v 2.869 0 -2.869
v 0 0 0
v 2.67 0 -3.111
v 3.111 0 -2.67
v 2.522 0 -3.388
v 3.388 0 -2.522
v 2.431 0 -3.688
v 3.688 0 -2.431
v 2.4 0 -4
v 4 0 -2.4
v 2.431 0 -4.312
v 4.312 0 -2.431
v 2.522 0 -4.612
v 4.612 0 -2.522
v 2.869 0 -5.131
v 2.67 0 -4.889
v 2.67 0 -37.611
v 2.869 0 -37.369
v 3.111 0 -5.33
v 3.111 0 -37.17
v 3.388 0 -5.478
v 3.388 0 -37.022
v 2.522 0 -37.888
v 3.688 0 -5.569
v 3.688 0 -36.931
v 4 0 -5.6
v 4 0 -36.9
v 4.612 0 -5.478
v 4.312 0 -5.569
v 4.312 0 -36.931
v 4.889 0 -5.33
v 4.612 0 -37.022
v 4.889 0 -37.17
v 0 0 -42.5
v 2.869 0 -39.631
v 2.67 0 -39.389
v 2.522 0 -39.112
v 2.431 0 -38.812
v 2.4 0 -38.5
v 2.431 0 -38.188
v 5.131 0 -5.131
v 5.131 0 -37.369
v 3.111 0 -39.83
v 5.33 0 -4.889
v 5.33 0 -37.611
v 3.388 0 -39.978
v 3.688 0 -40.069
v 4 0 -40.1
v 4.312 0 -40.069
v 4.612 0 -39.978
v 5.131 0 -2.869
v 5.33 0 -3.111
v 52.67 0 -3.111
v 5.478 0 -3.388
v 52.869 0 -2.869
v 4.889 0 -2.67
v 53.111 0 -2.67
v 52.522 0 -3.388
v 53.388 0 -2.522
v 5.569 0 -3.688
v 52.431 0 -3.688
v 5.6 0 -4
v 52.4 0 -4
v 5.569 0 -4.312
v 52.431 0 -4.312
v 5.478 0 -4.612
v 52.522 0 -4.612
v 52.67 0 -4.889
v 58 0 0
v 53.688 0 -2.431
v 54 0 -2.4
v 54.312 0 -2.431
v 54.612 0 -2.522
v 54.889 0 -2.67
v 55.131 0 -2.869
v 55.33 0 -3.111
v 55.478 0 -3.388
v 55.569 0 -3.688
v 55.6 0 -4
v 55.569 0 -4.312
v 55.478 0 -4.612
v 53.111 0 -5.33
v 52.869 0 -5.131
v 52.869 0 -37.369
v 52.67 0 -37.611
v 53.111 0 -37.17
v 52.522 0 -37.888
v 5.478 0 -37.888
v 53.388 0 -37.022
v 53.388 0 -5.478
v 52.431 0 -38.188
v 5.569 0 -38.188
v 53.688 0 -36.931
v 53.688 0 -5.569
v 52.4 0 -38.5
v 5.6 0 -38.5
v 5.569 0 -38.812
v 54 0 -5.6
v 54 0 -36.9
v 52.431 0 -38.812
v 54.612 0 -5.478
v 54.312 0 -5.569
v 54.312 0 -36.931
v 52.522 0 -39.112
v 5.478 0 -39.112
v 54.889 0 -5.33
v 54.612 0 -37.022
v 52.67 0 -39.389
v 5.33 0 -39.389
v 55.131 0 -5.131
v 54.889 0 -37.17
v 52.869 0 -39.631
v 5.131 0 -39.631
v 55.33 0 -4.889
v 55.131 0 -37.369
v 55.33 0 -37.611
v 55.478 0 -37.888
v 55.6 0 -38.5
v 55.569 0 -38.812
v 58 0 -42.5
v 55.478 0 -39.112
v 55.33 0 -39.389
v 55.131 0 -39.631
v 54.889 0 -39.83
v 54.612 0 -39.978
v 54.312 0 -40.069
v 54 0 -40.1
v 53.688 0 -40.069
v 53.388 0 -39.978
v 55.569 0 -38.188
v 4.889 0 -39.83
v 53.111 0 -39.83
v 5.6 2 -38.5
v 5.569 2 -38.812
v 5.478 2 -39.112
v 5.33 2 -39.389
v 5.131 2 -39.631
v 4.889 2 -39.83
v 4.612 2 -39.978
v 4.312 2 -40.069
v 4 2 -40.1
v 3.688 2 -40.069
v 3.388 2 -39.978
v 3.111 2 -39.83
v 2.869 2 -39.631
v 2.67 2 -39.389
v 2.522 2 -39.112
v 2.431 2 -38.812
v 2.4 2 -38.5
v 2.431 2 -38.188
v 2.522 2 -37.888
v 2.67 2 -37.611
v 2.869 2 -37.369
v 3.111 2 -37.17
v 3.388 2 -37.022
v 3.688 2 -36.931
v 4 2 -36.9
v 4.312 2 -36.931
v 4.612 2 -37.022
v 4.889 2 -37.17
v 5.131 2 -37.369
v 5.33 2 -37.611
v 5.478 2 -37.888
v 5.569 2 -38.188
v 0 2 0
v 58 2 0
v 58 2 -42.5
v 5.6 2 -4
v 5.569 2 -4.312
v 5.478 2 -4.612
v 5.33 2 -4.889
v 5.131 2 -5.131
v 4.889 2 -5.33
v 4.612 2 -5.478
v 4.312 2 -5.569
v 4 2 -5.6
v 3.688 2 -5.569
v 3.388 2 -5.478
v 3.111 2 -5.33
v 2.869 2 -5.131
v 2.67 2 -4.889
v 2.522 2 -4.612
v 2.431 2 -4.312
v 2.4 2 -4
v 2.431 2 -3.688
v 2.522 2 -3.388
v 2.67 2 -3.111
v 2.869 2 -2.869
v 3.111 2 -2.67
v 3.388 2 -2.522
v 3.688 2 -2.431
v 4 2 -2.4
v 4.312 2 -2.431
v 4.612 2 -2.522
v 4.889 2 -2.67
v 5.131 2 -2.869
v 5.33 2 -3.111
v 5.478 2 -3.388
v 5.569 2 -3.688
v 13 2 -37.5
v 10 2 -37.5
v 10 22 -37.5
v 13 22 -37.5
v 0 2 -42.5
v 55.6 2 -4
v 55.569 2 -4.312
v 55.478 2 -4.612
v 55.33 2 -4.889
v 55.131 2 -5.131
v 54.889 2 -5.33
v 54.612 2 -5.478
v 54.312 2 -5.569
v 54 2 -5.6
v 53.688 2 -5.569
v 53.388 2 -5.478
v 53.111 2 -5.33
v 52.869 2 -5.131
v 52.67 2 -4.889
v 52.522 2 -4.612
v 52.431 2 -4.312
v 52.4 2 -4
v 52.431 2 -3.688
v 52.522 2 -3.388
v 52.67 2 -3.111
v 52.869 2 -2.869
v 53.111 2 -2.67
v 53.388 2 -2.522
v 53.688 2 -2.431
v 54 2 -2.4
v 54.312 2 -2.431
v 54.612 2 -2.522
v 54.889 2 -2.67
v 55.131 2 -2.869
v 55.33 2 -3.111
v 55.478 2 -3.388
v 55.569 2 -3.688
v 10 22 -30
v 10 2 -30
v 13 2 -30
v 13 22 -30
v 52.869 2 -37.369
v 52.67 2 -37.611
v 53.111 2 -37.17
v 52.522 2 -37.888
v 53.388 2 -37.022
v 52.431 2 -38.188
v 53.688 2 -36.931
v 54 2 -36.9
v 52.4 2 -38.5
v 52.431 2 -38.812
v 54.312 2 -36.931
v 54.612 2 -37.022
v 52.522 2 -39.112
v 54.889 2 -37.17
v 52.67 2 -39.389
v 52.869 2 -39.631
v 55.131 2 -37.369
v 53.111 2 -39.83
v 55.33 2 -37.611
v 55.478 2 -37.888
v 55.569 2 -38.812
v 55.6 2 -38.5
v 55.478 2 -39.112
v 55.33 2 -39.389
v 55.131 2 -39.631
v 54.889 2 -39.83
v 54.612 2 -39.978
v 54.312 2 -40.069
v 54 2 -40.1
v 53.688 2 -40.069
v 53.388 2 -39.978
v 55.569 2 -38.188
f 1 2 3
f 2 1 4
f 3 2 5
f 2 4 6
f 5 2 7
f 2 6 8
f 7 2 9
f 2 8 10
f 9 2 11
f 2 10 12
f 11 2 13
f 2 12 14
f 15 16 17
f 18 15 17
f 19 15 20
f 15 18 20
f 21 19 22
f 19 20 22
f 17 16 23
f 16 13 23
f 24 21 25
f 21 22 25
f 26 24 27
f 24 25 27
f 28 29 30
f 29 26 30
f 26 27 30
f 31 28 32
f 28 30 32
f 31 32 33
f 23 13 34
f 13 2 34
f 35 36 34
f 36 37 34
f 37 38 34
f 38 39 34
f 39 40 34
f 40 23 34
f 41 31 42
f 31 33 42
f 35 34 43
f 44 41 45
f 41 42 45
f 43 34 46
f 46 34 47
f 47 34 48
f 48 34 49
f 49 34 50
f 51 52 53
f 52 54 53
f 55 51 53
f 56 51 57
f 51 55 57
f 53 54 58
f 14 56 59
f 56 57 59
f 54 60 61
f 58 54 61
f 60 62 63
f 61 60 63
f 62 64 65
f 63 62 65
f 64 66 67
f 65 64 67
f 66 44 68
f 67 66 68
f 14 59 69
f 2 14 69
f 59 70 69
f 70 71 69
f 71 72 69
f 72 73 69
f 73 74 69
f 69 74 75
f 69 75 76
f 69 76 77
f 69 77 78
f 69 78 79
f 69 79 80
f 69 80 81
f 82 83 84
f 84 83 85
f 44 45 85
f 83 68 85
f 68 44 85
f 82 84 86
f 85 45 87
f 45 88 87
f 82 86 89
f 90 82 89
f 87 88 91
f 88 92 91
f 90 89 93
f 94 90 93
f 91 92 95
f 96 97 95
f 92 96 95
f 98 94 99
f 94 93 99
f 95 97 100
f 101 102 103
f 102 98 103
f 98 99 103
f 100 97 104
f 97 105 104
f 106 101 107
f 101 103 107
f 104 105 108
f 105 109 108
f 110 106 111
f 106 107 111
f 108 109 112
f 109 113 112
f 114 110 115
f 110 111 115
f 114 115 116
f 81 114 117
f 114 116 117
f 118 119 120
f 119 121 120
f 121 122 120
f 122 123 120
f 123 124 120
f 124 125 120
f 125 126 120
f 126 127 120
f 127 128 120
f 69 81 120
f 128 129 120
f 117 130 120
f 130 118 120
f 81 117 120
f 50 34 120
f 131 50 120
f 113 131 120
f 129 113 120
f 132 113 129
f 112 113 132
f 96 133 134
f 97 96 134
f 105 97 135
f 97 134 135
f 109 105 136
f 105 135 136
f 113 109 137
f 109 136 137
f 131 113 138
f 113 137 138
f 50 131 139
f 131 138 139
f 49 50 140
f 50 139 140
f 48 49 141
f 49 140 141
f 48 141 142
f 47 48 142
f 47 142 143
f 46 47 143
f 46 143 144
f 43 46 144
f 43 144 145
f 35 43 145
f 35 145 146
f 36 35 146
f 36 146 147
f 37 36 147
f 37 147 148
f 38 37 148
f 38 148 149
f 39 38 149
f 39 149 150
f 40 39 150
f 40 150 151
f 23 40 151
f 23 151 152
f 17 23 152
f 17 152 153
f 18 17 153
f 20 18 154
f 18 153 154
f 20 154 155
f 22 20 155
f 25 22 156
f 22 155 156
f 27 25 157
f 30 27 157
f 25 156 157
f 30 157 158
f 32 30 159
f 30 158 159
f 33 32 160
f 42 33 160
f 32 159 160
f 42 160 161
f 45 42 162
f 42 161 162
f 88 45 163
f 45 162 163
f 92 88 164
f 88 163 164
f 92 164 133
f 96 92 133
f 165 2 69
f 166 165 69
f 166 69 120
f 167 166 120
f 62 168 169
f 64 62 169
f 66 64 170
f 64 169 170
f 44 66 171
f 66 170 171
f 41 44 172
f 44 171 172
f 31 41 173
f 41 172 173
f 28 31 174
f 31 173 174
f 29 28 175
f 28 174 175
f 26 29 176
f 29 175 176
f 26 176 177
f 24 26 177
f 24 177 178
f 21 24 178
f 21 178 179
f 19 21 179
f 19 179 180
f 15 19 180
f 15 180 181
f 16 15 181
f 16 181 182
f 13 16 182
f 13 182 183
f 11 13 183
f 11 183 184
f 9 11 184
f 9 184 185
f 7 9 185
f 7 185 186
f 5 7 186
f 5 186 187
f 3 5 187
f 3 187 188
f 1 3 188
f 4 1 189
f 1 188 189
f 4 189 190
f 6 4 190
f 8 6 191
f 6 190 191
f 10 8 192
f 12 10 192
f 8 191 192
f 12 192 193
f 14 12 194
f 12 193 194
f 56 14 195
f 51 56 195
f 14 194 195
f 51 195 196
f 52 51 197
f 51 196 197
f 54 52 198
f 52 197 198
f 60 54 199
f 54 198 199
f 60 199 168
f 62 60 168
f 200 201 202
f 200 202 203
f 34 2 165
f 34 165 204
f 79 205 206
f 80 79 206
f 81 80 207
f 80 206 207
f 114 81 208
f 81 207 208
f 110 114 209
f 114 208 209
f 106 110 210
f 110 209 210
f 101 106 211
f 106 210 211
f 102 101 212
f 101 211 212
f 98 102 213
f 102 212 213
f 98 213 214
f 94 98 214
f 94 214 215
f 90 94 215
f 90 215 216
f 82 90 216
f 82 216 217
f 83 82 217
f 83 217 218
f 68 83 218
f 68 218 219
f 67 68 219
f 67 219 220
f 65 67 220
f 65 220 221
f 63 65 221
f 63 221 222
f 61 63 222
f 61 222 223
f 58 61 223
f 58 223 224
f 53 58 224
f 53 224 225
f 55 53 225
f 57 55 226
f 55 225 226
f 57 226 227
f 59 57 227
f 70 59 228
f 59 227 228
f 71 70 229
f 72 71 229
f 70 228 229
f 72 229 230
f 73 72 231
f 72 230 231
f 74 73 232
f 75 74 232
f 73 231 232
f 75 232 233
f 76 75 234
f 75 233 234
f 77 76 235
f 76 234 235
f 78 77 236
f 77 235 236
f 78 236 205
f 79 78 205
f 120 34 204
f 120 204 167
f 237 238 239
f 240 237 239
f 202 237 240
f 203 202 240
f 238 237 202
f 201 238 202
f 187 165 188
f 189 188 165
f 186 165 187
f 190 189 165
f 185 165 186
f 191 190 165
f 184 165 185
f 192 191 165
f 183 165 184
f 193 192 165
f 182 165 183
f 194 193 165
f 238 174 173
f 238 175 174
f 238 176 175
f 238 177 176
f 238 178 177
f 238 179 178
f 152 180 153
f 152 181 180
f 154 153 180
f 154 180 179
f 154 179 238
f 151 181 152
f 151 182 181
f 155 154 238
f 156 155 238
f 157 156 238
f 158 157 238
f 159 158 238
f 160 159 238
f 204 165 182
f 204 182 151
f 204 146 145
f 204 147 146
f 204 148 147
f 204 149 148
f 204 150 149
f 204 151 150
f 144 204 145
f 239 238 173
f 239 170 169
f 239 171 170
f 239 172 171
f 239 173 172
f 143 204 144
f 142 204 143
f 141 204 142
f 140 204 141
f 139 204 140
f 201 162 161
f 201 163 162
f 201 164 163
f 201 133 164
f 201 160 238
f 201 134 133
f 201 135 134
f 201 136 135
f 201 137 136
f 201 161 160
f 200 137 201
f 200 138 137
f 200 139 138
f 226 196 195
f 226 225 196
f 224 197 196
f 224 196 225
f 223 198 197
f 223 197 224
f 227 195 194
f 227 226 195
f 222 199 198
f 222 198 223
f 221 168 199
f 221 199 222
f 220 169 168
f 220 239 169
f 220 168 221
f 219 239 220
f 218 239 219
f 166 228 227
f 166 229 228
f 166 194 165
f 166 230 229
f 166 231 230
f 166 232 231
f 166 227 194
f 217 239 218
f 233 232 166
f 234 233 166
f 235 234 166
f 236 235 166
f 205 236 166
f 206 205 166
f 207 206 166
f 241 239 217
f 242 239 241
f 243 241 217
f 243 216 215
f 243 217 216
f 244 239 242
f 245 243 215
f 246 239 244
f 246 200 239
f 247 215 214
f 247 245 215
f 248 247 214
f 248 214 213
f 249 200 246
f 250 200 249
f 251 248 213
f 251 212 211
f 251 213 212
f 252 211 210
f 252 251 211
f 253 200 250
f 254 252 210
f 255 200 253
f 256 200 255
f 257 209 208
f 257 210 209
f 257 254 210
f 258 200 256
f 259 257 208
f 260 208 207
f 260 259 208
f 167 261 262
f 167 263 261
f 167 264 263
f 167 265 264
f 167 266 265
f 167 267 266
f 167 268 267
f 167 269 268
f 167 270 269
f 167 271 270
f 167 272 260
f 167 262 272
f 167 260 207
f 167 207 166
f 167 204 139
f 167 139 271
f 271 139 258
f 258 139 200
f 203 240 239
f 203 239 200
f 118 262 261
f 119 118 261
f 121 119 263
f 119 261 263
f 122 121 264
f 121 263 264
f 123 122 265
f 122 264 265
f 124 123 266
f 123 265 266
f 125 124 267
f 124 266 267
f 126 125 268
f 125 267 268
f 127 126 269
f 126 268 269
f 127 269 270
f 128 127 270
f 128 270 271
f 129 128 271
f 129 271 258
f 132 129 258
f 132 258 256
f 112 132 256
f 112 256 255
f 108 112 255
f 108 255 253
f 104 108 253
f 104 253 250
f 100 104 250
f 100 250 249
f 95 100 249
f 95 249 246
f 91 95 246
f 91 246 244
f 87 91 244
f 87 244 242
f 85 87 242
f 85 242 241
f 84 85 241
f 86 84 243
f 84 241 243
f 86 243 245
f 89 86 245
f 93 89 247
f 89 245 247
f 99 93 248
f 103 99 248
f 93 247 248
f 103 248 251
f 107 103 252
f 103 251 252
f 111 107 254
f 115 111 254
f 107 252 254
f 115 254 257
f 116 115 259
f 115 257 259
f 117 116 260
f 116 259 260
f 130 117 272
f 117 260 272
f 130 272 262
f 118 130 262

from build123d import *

# Parameters (mm, degrees)
SKETCH_1_W          = 58
SKETCH_1_H          = 42.5
EXTRUDE_1_DEPTH     = 2
SKETCH_2_R          = 1.6
CUT_EXTRUDE_1_DEPTH = 3
SKETCH_3_W          = 3
SKETCH_3_H          = 7.5
EXTRUDE_2_DEPTH     = 20


with BuildPart() as part:
    # 草图1 → 凸台-拉伸1 (new body)
    with BuildSketch(Plane(origin=(0, 0, 0), x_dir=(1, 0, 0), z_dir=(0, 1, 0))):
        with Locations((29, 21.25)):
            Rectangle(SKETCH_1_W, SKETCH_1_H)
    extrude(amount=EXTRUDE_1_DEPTH)

    # 草图2 → 切除-拉伸1 (cut, through all)
    with BuildSketch(Plane(origin=(0, 2, 0), x_dir=(1, 0, 0), z_dir=(0, 1, 0))):
        with Locations((54, 38.5)):
            Circle(SKETCH_2_R)
        with Locations((54, 4)):
            Circle(SKETCH_2_R)
        with Locations((4, 4)):
            Circle(SKETCH_2_R)
        with Locations((4, 38.5)):
            Circle(SKETCH_2_R)
    extrude(amount=-CUT_EXTRUDE_1_DEPTH, mode=Mode.SUBTRACT)

    # 草图3 → 凸台-拉伸2 (add)
    with BuildSketch(Plane(origin=(0, 2, 0), x_dir=(1, 0, 0), z_dir=(0, 1, 0))):
        with Locations((11.5, 33.75)):
            Rectangle(SKETCH_3_W, SKETCH_3_H)
    extrude(amount=EXTRUDE_2_DEPTH)


solid = part.part
